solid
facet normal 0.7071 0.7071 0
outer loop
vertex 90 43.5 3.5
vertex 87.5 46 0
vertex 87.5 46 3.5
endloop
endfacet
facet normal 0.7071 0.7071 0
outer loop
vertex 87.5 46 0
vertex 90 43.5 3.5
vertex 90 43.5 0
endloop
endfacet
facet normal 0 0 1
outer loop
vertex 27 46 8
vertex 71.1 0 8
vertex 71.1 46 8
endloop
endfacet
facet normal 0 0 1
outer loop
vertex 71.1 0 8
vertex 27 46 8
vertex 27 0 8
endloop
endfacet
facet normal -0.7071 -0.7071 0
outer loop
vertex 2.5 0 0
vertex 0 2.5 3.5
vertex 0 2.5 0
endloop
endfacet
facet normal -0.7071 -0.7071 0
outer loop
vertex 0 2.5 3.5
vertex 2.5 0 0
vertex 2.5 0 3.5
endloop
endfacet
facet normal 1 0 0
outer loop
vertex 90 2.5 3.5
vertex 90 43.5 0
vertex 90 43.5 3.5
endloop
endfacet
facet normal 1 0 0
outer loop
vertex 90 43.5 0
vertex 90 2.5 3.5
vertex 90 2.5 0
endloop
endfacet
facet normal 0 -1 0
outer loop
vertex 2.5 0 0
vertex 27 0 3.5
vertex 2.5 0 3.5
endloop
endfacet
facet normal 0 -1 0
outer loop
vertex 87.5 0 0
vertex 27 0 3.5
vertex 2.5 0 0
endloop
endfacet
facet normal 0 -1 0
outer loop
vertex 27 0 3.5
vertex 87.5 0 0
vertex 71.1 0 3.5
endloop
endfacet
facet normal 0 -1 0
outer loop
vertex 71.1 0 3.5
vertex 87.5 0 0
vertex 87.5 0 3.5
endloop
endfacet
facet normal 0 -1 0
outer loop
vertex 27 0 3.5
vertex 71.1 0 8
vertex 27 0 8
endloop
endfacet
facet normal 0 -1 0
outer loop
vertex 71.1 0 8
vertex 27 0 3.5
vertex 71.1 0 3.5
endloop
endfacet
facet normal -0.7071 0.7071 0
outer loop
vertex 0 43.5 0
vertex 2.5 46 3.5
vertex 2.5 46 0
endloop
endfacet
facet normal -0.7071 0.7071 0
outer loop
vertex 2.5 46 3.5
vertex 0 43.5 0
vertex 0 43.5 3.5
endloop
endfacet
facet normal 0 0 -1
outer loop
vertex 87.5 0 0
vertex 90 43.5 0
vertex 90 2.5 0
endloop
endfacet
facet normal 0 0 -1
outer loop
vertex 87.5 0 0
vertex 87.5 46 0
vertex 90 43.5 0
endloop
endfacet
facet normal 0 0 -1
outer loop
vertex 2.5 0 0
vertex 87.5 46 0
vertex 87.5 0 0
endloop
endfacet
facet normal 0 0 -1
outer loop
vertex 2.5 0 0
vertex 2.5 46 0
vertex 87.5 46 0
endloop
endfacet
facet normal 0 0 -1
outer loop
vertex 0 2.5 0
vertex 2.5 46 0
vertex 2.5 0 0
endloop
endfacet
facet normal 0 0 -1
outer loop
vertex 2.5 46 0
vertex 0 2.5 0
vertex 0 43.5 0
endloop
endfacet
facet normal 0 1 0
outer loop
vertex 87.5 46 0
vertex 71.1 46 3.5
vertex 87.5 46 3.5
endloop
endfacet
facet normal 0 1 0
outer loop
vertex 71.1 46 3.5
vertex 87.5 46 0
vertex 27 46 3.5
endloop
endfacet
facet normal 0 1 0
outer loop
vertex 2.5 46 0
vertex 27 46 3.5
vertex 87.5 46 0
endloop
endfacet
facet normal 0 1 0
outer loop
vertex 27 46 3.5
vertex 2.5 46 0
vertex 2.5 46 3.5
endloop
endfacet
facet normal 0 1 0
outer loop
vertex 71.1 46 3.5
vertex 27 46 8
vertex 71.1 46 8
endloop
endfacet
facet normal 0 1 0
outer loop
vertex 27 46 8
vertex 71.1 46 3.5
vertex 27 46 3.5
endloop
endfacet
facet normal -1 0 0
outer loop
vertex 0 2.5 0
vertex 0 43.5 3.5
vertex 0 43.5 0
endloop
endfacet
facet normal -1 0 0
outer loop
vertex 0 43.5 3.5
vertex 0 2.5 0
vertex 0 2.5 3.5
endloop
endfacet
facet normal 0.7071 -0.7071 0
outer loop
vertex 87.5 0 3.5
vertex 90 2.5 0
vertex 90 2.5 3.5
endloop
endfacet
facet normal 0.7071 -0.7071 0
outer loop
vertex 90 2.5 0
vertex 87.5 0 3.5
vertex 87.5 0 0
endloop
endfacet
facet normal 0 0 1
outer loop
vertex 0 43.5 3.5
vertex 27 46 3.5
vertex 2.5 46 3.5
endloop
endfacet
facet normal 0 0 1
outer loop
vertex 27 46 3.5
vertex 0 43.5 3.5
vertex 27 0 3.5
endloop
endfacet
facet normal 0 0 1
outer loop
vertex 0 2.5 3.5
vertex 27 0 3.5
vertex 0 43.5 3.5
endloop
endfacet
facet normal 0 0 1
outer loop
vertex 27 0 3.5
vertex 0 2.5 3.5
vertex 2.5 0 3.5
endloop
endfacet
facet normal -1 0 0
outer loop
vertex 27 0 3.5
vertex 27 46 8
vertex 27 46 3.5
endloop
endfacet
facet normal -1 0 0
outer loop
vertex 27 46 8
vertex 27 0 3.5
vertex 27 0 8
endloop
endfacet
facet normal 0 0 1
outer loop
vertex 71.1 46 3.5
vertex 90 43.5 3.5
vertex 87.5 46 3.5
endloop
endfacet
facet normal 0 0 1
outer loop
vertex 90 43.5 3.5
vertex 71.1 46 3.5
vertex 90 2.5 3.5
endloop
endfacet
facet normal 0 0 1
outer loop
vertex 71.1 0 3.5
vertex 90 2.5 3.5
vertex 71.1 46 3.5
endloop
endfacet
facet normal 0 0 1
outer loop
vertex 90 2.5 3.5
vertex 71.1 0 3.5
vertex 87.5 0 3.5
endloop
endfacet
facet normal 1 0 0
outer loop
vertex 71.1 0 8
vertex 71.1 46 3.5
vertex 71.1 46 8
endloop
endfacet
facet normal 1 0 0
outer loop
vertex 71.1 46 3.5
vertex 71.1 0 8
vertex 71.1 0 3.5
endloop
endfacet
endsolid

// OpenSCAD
$fn = 32;

// ----------------------------------------------------------------------
// Stepped bar: centerstep, 90 x 46 x 8/3.5 mm
// ----------------------------------------------------------------------

// --- parameters (mm) ---
bar_l = 90;               // bar length, X
bar_w = 46;               // bar width, Y
plate_t = 8;              // thickness of the thick zone, Z
thin_t = 3.5;             // thickness of the thin zone
corner_c = 2.5;           // corner chamfer of the bar
step_cut = 4.5;           // material removed from the thin zone
thick_from = 27;          // start of the thick middle zone
thick_to = 71.1;          // end of the thick middle zone
depth_1 = 4.5;            // depth of cut 1 from the top face
depth_2 = 4.5;            // depth of cut 2 from the top face

profile = [[2.5, 0], [87.5, 0], [90, 2.5], [90, 43.5], [87.5, 46], [2.5, 46], [0, 43.5], [0, 2.5]];  // primary outline, 8 points, counter clockwise
void_1 = [[-1, -1], [27, -1], [27, 47], [-1, 47]];  // thin left end, 4 points
void_2 = [[71.1, -1], [91, -1], [91, 47], [71.1, 47]];  // thin right end, 4 points

// --- the one profile operation ---
difference() {
  linear_extrude(height = plate_t) polygon(points = profile);
  translate([0, 0, plate_t - depth_1])
    linear_extrude(height = depth_1 + 1) polygon(points = void_1);
  translate([0, 0, plate_t - depth_2])
    linear_extrude(height = depth_2 + 1) polygon(points = void_2);
}
